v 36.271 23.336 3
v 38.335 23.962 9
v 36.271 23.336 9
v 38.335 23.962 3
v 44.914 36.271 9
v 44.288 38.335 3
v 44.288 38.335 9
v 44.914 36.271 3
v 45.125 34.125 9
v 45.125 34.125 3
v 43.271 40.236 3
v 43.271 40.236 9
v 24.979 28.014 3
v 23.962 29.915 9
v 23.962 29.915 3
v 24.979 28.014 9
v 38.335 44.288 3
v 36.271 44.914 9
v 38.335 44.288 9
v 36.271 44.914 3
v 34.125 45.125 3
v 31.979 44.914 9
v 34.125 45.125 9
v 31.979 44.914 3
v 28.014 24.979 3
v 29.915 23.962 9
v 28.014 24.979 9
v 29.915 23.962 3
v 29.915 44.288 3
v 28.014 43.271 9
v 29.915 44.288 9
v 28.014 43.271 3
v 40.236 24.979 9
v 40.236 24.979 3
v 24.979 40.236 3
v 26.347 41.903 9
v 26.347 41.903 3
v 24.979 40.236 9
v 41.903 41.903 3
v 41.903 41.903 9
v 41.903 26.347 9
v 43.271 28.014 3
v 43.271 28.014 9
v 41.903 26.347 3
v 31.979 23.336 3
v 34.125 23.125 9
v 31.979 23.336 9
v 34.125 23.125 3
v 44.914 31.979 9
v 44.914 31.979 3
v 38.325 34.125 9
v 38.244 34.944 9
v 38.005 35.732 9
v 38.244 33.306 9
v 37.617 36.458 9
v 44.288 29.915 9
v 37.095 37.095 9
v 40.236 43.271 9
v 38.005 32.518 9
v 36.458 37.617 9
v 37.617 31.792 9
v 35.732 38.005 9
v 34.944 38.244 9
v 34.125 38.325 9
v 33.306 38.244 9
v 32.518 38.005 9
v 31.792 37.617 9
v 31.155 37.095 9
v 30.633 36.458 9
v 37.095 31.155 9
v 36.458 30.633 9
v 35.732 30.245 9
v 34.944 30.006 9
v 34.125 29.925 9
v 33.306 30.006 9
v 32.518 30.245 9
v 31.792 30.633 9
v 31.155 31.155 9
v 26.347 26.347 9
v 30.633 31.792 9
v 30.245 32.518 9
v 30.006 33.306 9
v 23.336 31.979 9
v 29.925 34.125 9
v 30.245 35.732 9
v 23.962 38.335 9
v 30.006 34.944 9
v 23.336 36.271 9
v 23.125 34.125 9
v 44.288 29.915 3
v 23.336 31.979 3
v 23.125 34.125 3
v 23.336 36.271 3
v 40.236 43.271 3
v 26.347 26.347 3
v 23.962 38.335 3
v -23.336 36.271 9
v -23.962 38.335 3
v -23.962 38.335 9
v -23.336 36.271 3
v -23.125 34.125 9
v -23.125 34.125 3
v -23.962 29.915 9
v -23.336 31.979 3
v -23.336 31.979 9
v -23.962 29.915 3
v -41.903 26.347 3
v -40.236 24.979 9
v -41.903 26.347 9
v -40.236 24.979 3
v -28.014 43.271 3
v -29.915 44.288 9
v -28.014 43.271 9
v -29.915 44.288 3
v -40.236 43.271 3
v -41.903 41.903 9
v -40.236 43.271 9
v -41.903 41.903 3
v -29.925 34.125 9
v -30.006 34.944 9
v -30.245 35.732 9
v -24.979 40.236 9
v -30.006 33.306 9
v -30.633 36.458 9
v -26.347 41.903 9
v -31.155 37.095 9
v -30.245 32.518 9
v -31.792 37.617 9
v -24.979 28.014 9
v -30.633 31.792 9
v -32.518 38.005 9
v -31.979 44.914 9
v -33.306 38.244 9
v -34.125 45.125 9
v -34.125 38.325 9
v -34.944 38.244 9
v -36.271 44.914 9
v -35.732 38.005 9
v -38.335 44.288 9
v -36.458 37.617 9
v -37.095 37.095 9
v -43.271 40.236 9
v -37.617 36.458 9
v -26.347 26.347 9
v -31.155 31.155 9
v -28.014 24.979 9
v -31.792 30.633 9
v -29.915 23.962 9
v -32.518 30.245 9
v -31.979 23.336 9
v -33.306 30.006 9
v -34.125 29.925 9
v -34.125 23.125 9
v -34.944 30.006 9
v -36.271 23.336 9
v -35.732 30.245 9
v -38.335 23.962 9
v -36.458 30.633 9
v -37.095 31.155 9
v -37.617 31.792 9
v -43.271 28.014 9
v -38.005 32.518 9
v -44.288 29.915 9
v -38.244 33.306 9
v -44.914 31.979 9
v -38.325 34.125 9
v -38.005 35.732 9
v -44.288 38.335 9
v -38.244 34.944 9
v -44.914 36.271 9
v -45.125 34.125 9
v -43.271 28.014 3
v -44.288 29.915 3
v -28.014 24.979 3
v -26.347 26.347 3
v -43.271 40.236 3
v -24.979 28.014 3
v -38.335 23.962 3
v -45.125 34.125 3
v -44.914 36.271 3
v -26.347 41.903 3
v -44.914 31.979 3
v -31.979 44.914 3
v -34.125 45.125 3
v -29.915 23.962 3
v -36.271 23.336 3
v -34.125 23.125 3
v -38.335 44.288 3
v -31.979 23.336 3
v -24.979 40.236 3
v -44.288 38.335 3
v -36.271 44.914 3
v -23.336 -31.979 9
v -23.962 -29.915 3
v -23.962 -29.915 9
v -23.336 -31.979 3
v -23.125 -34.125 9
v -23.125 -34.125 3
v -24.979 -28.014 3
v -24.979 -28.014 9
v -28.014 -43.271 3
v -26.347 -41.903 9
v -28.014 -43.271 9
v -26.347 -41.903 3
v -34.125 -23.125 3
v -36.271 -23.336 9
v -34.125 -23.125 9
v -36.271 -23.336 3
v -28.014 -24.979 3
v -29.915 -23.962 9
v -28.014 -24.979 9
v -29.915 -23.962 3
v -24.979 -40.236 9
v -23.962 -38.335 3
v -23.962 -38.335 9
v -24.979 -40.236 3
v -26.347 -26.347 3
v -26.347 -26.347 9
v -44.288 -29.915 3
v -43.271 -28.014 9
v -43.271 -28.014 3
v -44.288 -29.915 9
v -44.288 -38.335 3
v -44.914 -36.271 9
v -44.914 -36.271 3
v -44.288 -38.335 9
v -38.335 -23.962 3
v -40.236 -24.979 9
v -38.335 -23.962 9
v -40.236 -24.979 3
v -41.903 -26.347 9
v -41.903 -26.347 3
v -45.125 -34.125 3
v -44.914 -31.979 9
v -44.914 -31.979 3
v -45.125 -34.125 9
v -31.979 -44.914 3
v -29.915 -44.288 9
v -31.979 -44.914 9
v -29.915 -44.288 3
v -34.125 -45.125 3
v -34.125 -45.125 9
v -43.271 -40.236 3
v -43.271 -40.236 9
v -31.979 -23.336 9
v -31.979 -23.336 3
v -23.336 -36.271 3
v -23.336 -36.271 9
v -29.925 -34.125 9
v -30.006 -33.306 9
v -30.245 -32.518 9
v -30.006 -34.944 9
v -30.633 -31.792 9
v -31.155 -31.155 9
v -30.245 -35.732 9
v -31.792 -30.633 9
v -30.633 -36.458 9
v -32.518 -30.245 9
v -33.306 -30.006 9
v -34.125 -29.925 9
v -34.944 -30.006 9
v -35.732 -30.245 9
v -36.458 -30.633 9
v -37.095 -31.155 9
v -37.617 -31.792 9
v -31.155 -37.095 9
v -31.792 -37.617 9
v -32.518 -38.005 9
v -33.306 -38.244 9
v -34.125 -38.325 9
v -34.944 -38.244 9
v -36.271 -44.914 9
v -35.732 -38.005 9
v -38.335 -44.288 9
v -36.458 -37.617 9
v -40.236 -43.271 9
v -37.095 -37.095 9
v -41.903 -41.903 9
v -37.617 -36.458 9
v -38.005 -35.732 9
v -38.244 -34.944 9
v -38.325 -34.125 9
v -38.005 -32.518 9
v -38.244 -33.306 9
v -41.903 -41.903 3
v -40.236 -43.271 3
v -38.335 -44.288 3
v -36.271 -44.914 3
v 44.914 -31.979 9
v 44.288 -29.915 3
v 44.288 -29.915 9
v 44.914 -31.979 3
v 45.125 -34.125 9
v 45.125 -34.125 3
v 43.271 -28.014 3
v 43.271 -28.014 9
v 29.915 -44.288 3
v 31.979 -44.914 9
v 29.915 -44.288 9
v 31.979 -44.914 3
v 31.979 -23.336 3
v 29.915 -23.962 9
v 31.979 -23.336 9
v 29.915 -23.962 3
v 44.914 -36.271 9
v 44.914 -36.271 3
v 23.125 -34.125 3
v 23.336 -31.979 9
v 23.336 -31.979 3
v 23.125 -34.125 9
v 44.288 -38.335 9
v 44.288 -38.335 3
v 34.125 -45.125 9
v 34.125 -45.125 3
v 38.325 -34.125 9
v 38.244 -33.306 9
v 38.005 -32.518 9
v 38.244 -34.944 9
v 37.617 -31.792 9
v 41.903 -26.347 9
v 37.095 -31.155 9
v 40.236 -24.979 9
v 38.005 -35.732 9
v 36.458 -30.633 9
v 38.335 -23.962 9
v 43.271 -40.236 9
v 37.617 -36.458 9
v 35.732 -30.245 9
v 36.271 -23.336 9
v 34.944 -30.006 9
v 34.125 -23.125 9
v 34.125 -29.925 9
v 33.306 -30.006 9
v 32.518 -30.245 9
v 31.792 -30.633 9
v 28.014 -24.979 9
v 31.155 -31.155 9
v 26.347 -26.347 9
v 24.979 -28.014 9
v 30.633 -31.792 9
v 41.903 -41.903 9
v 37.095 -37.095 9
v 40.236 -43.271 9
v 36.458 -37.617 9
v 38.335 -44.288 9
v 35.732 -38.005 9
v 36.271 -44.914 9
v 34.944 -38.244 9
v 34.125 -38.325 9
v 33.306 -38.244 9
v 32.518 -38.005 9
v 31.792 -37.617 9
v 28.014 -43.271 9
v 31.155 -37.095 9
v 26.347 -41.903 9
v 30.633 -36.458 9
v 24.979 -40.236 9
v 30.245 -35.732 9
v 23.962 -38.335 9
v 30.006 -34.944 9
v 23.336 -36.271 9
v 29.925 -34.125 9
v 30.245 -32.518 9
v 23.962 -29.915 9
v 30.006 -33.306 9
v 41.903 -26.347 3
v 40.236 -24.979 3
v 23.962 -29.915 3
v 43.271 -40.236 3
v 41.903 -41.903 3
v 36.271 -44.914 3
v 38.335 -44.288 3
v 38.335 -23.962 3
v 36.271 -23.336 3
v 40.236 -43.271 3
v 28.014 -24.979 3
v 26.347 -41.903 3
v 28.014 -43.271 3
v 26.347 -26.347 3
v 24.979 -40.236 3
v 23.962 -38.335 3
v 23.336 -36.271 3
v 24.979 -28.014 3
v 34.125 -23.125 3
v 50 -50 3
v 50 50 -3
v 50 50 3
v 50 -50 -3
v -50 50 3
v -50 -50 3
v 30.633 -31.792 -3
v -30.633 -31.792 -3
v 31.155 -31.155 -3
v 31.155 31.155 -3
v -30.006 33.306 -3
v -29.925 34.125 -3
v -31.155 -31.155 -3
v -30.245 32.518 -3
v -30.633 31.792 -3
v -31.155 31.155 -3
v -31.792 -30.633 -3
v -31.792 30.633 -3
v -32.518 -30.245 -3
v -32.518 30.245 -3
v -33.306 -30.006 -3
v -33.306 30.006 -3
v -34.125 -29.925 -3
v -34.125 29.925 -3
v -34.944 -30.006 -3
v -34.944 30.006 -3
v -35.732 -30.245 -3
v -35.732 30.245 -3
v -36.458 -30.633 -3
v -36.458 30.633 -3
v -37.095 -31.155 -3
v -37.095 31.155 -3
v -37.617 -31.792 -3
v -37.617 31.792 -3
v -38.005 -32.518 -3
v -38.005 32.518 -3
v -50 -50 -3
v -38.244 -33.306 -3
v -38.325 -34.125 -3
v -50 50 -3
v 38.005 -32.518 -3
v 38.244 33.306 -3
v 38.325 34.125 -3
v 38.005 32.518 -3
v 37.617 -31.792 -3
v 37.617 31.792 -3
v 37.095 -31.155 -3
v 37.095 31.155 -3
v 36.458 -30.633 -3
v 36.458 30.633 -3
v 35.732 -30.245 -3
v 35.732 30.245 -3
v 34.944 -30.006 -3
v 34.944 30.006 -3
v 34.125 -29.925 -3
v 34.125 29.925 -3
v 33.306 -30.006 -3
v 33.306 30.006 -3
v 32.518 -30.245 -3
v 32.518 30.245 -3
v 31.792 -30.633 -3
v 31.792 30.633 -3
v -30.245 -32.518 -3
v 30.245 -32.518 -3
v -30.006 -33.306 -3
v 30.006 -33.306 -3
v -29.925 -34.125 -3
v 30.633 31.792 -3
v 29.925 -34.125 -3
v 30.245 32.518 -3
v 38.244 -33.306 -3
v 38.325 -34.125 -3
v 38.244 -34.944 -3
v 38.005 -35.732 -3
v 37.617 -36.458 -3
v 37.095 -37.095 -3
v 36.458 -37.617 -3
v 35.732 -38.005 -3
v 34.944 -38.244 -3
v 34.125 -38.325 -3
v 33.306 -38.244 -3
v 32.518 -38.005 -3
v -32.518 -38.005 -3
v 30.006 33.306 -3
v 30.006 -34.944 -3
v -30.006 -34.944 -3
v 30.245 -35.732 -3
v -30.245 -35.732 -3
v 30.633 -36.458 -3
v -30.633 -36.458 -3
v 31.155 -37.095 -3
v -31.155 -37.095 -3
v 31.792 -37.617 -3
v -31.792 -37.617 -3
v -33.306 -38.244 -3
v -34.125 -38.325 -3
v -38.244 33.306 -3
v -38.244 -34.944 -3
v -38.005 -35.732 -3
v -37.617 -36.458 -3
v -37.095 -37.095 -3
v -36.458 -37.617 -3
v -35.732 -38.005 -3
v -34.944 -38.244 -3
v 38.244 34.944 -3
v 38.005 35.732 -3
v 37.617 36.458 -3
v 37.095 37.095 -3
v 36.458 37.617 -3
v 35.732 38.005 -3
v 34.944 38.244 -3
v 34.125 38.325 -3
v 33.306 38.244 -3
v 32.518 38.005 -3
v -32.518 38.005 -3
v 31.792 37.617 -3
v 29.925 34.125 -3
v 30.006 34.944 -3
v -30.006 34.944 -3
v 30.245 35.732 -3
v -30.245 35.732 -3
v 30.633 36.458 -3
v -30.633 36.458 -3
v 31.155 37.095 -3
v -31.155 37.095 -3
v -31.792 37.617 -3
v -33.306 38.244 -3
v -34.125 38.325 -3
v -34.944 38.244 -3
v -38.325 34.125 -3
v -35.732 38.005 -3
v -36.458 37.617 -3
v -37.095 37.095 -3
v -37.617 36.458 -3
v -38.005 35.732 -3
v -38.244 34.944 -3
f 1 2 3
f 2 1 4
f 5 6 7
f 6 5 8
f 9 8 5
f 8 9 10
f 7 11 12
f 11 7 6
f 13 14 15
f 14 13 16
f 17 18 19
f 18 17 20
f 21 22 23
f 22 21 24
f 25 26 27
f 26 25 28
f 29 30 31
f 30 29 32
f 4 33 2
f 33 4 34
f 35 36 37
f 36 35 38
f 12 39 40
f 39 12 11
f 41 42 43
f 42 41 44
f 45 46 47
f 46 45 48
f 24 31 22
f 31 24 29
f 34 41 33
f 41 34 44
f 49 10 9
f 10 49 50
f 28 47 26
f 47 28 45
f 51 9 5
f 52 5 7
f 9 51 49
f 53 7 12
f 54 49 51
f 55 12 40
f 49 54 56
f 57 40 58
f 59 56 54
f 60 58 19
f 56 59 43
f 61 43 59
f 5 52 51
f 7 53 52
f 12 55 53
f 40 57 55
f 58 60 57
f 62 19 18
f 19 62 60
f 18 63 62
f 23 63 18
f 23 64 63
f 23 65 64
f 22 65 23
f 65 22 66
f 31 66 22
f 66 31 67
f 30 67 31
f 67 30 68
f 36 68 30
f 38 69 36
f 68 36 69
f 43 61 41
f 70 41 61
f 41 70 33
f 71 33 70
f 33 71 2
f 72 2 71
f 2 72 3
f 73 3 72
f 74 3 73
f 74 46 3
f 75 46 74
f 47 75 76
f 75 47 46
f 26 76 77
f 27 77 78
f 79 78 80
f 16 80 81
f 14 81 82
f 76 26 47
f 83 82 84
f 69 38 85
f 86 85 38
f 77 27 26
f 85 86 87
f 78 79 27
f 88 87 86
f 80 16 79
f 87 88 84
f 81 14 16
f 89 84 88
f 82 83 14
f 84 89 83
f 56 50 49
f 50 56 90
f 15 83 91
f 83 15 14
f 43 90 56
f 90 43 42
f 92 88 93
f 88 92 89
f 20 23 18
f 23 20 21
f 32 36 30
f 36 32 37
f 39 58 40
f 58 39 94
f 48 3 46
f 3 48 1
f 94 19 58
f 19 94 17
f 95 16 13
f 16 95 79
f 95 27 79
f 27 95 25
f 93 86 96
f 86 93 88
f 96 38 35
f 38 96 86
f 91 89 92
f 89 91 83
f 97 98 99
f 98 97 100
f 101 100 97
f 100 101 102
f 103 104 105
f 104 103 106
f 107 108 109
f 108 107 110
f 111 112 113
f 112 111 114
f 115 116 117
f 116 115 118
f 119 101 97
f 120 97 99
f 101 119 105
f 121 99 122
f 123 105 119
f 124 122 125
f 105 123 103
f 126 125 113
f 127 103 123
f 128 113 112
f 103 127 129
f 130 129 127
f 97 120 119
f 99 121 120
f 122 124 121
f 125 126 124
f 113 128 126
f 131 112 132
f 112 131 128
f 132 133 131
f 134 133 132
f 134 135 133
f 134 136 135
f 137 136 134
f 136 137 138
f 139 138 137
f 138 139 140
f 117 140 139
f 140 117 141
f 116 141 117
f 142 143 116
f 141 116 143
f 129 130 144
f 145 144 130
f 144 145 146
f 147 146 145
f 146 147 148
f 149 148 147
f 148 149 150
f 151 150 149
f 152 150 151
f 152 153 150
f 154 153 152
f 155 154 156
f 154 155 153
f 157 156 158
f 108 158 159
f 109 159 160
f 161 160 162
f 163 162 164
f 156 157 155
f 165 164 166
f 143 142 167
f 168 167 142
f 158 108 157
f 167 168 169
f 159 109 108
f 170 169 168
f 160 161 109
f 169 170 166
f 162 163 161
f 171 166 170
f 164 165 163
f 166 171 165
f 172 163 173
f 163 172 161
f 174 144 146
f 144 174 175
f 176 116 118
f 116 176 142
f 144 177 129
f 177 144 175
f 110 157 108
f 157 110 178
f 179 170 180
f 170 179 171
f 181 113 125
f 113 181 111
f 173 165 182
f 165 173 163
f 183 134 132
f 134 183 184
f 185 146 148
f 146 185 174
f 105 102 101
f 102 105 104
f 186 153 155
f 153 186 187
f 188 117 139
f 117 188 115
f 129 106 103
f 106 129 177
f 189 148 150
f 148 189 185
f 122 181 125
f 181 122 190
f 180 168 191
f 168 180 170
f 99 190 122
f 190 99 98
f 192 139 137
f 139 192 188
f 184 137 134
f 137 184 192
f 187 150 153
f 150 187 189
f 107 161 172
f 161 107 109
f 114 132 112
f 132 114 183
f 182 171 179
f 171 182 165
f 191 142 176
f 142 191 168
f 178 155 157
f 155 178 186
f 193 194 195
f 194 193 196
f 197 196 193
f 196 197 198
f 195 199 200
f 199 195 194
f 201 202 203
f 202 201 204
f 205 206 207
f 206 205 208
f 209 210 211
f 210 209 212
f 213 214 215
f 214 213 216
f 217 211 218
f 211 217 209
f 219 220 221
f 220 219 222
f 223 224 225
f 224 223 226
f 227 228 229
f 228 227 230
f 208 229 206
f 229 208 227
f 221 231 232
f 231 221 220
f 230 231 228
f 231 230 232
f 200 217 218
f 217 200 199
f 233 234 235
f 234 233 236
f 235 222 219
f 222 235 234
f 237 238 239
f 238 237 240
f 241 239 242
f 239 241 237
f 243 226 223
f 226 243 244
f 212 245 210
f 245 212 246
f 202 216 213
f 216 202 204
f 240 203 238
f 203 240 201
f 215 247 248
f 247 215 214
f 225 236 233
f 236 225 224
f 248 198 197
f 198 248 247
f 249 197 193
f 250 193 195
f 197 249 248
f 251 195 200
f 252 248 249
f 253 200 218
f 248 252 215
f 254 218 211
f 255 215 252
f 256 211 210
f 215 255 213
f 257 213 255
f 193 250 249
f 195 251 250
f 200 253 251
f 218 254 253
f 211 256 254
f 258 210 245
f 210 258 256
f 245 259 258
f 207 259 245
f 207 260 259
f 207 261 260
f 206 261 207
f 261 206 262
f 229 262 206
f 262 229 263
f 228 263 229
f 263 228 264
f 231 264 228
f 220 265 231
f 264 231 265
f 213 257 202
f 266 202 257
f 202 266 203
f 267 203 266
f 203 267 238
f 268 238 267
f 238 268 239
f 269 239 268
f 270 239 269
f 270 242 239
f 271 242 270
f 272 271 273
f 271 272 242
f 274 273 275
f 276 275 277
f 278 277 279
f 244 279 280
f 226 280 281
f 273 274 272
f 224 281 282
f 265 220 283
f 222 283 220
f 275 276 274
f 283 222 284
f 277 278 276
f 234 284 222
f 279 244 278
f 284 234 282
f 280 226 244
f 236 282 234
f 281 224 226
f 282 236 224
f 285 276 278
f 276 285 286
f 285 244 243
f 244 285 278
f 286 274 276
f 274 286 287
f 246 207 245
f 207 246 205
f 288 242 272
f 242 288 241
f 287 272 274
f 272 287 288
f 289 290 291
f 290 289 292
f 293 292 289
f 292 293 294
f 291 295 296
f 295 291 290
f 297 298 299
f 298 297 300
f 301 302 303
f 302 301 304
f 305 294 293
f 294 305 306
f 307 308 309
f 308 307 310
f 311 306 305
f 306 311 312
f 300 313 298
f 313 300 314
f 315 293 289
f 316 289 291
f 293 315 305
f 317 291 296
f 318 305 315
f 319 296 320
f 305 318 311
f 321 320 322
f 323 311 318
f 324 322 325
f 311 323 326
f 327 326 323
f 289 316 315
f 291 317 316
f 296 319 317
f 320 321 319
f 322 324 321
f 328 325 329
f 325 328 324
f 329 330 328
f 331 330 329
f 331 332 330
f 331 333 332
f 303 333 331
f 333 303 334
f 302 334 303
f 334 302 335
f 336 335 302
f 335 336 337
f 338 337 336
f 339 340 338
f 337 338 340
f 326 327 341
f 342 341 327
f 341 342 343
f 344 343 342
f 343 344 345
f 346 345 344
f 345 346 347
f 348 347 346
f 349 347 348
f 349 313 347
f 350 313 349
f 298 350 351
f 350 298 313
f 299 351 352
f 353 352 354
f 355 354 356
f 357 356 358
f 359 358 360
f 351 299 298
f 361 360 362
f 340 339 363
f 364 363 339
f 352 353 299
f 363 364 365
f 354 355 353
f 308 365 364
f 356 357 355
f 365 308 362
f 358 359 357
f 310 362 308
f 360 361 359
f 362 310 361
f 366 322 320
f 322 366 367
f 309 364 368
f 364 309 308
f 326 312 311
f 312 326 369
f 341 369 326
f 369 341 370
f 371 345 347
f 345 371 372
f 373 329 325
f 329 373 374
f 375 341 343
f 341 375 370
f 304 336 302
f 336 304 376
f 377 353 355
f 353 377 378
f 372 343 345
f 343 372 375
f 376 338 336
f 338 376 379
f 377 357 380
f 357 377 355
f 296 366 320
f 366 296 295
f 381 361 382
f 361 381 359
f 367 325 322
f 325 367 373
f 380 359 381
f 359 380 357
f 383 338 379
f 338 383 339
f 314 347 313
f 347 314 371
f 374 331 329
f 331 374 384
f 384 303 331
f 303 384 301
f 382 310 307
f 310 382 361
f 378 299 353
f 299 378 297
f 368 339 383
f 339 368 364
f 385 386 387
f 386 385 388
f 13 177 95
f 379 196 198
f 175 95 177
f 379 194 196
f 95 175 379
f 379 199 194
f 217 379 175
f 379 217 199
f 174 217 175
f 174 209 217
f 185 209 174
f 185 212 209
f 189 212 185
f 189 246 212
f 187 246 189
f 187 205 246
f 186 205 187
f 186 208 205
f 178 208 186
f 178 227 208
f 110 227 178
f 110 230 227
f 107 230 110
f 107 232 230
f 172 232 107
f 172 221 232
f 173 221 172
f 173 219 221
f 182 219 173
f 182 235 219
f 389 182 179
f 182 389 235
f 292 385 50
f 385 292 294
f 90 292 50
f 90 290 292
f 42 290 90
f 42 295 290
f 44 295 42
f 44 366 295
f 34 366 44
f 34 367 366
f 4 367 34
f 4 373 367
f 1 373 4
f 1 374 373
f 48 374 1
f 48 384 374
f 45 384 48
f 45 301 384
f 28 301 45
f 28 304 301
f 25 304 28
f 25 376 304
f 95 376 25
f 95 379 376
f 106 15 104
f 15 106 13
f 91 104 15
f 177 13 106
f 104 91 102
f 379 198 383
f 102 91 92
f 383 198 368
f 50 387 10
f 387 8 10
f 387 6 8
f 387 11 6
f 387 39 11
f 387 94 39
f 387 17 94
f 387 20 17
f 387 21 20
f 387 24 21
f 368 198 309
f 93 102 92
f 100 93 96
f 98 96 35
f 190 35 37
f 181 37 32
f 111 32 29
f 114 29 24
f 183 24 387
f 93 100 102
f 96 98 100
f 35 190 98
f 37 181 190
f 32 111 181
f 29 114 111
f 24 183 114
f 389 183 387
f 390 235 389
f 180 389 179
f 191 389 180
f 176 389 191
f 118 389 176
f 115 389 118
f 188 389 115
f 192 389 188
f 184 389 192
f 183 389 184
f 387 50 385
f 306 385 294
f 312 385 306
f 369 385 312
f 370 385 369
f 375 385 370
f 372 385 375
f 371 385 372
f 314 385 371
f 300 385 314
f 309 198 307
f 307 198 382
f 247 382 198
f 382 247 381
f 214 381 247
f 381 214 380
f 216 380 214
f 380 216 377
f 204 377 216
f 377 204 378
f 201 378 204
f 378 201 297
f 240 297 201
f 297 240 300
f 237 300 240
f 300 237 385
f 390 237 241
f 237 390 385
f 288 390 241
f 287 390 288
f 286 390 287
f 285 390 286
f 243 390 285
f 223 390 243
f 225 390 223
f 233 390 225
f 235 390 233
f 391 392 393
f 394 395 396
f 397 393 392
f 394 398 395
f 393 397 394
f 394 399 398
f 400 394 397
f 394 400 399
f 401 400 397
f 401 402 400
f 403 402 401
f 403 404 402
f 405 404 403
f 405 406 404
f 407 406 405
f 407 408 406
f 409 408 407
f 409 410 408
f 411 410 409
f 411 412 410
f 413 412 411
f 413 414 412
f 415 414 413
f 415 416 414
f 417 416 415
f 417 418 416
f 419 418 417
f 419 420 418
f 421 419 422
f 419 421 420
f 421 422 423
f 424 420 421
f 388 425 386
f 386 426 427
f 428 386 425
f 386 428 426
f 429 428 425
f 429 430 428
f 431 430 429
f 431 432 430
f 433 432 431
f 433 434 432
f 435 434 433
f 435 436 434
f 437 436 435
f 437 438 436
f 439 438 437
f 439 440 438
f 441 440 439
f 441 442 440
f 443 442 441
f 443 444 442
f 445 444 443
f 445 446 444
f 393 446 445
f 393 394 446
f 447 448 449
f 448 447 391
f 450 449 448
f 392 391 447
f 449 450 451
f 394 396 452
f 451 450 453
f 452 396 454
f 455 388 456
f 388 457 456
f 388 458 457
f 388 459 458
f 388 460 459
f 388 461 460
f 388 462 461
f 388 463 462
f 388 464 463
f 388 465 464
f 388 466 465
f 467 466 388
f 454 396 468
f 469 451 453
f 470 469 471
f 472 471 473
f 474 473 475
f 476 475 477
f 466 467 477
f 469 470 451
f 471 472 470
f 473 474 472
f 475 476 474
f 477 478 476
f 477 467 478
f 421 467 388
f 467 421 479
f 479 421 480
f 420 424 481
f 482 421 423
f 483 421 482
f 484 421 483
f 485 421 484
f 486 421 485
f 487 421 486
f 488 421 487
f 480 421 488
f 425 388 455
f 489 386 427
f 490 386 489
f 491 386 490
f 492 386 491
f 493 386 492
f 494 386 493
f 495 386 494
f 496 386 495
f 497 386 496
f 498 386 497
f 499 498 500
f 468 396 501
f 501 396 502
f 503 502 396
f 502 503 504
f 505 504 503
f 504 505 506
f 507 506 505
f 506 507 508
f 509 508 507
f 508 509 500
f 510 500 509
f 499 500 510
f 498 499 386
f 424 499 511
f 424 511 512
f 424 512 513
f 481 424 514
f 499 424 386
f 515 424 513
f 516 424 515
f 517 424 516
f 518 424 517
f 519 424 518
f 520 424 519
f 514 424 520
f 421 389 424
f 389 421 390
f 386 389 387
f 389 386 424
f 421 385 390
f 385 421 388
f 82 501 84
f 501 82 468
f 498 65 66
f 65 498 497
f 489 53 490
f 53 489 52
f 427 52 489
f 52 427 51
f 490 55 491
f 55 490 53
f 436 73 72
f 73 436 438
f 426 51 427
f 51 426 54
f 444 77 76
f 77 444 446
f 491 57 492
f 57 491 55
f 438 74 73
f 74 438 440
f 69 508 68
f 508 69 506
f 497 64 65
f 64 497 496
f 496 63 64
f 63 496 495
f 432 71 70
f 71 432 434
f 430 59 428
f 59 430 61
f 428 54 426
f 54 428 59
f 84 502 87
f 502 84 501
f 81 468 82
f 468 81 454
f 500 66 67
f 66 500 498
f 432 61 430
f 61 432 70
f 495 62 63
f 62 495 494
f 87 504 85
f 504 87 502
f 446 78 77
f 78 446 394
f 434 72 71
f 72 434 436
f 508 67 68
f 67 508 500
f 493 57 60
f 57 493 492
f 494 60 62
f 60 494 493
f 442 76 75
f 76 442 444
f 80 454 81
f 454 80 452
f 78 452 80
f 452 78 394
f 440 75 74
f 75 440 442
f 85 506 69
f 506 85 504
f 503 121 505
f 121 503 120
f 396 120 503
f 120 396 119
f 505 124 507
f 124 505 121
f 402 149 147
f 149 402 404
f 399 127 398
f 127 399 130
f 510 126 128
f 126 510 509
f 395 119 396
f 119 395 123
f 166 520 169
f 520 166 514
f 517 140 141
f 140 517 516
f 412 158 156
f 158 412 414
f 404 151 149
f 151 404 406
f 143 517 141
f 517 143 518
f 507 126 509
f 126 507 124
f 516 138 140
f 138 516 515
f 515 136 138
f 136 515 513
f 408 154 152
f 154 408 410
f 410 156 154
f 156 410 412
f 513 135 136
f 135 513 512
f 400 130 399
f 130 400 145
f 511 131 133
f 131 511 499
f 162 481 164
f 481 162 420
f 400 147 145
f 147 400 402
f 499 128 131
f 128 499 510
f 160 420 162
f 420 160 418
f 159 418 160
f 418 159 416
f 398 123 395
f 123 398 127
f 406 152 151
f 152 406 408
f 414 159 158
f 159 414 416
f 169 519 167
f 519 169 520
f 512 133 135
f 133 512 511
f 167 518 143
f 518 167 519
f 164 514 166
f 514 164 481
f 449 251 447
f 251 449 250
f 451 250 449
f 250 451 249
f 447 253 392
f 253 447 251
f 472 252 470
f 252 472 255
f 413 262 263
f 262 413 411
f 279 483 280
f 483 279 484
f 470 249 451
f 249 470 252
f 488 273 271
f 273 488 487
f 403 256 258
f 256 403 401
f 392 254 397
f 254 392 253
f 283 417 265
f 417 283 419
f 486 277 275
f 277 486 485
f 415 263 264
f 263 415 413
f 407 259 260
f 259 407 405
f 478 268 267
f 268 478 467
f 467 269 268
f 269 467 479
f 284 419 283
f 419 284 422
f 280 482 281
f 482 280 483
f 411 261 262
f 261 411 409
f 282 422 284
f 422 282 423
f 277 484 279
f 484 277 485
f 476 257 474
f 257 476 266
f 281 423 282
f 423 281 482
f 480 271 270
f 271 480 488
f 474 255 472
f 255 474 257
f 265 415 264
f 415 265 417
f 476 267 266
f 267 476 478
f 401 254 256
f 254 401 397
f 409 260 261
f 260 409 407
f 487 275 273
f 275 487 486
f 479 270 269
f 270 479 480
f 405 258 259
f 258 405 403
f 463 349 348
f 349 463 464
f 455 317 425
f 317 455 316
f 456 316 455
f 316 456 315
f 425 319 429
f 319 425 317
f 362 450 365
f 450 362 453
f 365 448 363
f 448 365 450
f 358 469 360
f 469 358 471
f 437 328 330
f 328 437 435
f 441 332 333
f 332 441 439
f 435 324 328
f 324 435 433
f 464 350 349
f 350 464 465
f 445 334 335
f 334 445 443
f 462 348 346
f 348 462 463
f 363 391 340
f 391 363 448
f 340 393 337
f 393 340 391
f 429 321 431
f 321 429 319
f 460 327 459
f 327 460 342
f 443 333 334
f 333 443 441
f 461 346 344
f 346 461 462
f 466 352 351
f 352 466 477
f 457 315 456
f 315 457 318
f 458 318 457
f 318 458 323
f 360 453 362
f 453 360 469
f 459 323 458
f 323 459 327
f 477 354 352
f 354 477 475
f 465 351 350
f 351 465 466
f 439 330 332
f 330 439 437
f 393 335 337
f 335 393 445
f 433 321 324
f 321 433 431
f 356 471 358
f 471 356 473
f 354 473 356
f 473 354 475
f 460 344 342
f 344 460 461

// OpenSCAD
$fn = 32;

// ----------------------------------------------------------------------
// Anchor pads 100 x 100 x 12
// four corner bosses with anchor holes
// ----------------------------------------------------------------------

// --- parameters (mm) ---
plate = [100, 100, 6];  // base plate size (x, y, z)
pads = 4;               // boss count, one per corner
edge = 15.875;          // boss centre offset from the plate edge
boss_d = 22;            // boss diameter
boss_h = 6;             // boss height above the base plate
hole_d = 8.4;           // hole diameter

// --- derived feature positions (mm) ---
height = plate[2] + boss_h;      // = 12   overall height of the part
corner_x = plate[0] / 2 - edge;  // = 34.12   boss centre X
corner_y = plate[1] / 2 - edge;  // = 34.12   boss centre Y
feature_centers = [
  [corner_x, corner_y],
  [-corner_x, corner_y],
  [-corner_x, -corner_y],
  [corner_x, -corner_y]
];   // boss centres, anchor holes are drilled there

// base plate, four bosses standing on it, anchor holes all the way through
difference() {
  union() {
    cube(plate, center = true);
    for (centre = feature_centers)
      translate([centre[0], centre[1], plate[2] / 2 - 1])
        cylinder(d = boss_d, h = boss_h + 1);
  }
  for (centre = feature_centers)
    translate([centre[0], centre[1], -height])
      cylinder(d = hole_d, h = 2 * height + 2);  // through boss and plate
}
